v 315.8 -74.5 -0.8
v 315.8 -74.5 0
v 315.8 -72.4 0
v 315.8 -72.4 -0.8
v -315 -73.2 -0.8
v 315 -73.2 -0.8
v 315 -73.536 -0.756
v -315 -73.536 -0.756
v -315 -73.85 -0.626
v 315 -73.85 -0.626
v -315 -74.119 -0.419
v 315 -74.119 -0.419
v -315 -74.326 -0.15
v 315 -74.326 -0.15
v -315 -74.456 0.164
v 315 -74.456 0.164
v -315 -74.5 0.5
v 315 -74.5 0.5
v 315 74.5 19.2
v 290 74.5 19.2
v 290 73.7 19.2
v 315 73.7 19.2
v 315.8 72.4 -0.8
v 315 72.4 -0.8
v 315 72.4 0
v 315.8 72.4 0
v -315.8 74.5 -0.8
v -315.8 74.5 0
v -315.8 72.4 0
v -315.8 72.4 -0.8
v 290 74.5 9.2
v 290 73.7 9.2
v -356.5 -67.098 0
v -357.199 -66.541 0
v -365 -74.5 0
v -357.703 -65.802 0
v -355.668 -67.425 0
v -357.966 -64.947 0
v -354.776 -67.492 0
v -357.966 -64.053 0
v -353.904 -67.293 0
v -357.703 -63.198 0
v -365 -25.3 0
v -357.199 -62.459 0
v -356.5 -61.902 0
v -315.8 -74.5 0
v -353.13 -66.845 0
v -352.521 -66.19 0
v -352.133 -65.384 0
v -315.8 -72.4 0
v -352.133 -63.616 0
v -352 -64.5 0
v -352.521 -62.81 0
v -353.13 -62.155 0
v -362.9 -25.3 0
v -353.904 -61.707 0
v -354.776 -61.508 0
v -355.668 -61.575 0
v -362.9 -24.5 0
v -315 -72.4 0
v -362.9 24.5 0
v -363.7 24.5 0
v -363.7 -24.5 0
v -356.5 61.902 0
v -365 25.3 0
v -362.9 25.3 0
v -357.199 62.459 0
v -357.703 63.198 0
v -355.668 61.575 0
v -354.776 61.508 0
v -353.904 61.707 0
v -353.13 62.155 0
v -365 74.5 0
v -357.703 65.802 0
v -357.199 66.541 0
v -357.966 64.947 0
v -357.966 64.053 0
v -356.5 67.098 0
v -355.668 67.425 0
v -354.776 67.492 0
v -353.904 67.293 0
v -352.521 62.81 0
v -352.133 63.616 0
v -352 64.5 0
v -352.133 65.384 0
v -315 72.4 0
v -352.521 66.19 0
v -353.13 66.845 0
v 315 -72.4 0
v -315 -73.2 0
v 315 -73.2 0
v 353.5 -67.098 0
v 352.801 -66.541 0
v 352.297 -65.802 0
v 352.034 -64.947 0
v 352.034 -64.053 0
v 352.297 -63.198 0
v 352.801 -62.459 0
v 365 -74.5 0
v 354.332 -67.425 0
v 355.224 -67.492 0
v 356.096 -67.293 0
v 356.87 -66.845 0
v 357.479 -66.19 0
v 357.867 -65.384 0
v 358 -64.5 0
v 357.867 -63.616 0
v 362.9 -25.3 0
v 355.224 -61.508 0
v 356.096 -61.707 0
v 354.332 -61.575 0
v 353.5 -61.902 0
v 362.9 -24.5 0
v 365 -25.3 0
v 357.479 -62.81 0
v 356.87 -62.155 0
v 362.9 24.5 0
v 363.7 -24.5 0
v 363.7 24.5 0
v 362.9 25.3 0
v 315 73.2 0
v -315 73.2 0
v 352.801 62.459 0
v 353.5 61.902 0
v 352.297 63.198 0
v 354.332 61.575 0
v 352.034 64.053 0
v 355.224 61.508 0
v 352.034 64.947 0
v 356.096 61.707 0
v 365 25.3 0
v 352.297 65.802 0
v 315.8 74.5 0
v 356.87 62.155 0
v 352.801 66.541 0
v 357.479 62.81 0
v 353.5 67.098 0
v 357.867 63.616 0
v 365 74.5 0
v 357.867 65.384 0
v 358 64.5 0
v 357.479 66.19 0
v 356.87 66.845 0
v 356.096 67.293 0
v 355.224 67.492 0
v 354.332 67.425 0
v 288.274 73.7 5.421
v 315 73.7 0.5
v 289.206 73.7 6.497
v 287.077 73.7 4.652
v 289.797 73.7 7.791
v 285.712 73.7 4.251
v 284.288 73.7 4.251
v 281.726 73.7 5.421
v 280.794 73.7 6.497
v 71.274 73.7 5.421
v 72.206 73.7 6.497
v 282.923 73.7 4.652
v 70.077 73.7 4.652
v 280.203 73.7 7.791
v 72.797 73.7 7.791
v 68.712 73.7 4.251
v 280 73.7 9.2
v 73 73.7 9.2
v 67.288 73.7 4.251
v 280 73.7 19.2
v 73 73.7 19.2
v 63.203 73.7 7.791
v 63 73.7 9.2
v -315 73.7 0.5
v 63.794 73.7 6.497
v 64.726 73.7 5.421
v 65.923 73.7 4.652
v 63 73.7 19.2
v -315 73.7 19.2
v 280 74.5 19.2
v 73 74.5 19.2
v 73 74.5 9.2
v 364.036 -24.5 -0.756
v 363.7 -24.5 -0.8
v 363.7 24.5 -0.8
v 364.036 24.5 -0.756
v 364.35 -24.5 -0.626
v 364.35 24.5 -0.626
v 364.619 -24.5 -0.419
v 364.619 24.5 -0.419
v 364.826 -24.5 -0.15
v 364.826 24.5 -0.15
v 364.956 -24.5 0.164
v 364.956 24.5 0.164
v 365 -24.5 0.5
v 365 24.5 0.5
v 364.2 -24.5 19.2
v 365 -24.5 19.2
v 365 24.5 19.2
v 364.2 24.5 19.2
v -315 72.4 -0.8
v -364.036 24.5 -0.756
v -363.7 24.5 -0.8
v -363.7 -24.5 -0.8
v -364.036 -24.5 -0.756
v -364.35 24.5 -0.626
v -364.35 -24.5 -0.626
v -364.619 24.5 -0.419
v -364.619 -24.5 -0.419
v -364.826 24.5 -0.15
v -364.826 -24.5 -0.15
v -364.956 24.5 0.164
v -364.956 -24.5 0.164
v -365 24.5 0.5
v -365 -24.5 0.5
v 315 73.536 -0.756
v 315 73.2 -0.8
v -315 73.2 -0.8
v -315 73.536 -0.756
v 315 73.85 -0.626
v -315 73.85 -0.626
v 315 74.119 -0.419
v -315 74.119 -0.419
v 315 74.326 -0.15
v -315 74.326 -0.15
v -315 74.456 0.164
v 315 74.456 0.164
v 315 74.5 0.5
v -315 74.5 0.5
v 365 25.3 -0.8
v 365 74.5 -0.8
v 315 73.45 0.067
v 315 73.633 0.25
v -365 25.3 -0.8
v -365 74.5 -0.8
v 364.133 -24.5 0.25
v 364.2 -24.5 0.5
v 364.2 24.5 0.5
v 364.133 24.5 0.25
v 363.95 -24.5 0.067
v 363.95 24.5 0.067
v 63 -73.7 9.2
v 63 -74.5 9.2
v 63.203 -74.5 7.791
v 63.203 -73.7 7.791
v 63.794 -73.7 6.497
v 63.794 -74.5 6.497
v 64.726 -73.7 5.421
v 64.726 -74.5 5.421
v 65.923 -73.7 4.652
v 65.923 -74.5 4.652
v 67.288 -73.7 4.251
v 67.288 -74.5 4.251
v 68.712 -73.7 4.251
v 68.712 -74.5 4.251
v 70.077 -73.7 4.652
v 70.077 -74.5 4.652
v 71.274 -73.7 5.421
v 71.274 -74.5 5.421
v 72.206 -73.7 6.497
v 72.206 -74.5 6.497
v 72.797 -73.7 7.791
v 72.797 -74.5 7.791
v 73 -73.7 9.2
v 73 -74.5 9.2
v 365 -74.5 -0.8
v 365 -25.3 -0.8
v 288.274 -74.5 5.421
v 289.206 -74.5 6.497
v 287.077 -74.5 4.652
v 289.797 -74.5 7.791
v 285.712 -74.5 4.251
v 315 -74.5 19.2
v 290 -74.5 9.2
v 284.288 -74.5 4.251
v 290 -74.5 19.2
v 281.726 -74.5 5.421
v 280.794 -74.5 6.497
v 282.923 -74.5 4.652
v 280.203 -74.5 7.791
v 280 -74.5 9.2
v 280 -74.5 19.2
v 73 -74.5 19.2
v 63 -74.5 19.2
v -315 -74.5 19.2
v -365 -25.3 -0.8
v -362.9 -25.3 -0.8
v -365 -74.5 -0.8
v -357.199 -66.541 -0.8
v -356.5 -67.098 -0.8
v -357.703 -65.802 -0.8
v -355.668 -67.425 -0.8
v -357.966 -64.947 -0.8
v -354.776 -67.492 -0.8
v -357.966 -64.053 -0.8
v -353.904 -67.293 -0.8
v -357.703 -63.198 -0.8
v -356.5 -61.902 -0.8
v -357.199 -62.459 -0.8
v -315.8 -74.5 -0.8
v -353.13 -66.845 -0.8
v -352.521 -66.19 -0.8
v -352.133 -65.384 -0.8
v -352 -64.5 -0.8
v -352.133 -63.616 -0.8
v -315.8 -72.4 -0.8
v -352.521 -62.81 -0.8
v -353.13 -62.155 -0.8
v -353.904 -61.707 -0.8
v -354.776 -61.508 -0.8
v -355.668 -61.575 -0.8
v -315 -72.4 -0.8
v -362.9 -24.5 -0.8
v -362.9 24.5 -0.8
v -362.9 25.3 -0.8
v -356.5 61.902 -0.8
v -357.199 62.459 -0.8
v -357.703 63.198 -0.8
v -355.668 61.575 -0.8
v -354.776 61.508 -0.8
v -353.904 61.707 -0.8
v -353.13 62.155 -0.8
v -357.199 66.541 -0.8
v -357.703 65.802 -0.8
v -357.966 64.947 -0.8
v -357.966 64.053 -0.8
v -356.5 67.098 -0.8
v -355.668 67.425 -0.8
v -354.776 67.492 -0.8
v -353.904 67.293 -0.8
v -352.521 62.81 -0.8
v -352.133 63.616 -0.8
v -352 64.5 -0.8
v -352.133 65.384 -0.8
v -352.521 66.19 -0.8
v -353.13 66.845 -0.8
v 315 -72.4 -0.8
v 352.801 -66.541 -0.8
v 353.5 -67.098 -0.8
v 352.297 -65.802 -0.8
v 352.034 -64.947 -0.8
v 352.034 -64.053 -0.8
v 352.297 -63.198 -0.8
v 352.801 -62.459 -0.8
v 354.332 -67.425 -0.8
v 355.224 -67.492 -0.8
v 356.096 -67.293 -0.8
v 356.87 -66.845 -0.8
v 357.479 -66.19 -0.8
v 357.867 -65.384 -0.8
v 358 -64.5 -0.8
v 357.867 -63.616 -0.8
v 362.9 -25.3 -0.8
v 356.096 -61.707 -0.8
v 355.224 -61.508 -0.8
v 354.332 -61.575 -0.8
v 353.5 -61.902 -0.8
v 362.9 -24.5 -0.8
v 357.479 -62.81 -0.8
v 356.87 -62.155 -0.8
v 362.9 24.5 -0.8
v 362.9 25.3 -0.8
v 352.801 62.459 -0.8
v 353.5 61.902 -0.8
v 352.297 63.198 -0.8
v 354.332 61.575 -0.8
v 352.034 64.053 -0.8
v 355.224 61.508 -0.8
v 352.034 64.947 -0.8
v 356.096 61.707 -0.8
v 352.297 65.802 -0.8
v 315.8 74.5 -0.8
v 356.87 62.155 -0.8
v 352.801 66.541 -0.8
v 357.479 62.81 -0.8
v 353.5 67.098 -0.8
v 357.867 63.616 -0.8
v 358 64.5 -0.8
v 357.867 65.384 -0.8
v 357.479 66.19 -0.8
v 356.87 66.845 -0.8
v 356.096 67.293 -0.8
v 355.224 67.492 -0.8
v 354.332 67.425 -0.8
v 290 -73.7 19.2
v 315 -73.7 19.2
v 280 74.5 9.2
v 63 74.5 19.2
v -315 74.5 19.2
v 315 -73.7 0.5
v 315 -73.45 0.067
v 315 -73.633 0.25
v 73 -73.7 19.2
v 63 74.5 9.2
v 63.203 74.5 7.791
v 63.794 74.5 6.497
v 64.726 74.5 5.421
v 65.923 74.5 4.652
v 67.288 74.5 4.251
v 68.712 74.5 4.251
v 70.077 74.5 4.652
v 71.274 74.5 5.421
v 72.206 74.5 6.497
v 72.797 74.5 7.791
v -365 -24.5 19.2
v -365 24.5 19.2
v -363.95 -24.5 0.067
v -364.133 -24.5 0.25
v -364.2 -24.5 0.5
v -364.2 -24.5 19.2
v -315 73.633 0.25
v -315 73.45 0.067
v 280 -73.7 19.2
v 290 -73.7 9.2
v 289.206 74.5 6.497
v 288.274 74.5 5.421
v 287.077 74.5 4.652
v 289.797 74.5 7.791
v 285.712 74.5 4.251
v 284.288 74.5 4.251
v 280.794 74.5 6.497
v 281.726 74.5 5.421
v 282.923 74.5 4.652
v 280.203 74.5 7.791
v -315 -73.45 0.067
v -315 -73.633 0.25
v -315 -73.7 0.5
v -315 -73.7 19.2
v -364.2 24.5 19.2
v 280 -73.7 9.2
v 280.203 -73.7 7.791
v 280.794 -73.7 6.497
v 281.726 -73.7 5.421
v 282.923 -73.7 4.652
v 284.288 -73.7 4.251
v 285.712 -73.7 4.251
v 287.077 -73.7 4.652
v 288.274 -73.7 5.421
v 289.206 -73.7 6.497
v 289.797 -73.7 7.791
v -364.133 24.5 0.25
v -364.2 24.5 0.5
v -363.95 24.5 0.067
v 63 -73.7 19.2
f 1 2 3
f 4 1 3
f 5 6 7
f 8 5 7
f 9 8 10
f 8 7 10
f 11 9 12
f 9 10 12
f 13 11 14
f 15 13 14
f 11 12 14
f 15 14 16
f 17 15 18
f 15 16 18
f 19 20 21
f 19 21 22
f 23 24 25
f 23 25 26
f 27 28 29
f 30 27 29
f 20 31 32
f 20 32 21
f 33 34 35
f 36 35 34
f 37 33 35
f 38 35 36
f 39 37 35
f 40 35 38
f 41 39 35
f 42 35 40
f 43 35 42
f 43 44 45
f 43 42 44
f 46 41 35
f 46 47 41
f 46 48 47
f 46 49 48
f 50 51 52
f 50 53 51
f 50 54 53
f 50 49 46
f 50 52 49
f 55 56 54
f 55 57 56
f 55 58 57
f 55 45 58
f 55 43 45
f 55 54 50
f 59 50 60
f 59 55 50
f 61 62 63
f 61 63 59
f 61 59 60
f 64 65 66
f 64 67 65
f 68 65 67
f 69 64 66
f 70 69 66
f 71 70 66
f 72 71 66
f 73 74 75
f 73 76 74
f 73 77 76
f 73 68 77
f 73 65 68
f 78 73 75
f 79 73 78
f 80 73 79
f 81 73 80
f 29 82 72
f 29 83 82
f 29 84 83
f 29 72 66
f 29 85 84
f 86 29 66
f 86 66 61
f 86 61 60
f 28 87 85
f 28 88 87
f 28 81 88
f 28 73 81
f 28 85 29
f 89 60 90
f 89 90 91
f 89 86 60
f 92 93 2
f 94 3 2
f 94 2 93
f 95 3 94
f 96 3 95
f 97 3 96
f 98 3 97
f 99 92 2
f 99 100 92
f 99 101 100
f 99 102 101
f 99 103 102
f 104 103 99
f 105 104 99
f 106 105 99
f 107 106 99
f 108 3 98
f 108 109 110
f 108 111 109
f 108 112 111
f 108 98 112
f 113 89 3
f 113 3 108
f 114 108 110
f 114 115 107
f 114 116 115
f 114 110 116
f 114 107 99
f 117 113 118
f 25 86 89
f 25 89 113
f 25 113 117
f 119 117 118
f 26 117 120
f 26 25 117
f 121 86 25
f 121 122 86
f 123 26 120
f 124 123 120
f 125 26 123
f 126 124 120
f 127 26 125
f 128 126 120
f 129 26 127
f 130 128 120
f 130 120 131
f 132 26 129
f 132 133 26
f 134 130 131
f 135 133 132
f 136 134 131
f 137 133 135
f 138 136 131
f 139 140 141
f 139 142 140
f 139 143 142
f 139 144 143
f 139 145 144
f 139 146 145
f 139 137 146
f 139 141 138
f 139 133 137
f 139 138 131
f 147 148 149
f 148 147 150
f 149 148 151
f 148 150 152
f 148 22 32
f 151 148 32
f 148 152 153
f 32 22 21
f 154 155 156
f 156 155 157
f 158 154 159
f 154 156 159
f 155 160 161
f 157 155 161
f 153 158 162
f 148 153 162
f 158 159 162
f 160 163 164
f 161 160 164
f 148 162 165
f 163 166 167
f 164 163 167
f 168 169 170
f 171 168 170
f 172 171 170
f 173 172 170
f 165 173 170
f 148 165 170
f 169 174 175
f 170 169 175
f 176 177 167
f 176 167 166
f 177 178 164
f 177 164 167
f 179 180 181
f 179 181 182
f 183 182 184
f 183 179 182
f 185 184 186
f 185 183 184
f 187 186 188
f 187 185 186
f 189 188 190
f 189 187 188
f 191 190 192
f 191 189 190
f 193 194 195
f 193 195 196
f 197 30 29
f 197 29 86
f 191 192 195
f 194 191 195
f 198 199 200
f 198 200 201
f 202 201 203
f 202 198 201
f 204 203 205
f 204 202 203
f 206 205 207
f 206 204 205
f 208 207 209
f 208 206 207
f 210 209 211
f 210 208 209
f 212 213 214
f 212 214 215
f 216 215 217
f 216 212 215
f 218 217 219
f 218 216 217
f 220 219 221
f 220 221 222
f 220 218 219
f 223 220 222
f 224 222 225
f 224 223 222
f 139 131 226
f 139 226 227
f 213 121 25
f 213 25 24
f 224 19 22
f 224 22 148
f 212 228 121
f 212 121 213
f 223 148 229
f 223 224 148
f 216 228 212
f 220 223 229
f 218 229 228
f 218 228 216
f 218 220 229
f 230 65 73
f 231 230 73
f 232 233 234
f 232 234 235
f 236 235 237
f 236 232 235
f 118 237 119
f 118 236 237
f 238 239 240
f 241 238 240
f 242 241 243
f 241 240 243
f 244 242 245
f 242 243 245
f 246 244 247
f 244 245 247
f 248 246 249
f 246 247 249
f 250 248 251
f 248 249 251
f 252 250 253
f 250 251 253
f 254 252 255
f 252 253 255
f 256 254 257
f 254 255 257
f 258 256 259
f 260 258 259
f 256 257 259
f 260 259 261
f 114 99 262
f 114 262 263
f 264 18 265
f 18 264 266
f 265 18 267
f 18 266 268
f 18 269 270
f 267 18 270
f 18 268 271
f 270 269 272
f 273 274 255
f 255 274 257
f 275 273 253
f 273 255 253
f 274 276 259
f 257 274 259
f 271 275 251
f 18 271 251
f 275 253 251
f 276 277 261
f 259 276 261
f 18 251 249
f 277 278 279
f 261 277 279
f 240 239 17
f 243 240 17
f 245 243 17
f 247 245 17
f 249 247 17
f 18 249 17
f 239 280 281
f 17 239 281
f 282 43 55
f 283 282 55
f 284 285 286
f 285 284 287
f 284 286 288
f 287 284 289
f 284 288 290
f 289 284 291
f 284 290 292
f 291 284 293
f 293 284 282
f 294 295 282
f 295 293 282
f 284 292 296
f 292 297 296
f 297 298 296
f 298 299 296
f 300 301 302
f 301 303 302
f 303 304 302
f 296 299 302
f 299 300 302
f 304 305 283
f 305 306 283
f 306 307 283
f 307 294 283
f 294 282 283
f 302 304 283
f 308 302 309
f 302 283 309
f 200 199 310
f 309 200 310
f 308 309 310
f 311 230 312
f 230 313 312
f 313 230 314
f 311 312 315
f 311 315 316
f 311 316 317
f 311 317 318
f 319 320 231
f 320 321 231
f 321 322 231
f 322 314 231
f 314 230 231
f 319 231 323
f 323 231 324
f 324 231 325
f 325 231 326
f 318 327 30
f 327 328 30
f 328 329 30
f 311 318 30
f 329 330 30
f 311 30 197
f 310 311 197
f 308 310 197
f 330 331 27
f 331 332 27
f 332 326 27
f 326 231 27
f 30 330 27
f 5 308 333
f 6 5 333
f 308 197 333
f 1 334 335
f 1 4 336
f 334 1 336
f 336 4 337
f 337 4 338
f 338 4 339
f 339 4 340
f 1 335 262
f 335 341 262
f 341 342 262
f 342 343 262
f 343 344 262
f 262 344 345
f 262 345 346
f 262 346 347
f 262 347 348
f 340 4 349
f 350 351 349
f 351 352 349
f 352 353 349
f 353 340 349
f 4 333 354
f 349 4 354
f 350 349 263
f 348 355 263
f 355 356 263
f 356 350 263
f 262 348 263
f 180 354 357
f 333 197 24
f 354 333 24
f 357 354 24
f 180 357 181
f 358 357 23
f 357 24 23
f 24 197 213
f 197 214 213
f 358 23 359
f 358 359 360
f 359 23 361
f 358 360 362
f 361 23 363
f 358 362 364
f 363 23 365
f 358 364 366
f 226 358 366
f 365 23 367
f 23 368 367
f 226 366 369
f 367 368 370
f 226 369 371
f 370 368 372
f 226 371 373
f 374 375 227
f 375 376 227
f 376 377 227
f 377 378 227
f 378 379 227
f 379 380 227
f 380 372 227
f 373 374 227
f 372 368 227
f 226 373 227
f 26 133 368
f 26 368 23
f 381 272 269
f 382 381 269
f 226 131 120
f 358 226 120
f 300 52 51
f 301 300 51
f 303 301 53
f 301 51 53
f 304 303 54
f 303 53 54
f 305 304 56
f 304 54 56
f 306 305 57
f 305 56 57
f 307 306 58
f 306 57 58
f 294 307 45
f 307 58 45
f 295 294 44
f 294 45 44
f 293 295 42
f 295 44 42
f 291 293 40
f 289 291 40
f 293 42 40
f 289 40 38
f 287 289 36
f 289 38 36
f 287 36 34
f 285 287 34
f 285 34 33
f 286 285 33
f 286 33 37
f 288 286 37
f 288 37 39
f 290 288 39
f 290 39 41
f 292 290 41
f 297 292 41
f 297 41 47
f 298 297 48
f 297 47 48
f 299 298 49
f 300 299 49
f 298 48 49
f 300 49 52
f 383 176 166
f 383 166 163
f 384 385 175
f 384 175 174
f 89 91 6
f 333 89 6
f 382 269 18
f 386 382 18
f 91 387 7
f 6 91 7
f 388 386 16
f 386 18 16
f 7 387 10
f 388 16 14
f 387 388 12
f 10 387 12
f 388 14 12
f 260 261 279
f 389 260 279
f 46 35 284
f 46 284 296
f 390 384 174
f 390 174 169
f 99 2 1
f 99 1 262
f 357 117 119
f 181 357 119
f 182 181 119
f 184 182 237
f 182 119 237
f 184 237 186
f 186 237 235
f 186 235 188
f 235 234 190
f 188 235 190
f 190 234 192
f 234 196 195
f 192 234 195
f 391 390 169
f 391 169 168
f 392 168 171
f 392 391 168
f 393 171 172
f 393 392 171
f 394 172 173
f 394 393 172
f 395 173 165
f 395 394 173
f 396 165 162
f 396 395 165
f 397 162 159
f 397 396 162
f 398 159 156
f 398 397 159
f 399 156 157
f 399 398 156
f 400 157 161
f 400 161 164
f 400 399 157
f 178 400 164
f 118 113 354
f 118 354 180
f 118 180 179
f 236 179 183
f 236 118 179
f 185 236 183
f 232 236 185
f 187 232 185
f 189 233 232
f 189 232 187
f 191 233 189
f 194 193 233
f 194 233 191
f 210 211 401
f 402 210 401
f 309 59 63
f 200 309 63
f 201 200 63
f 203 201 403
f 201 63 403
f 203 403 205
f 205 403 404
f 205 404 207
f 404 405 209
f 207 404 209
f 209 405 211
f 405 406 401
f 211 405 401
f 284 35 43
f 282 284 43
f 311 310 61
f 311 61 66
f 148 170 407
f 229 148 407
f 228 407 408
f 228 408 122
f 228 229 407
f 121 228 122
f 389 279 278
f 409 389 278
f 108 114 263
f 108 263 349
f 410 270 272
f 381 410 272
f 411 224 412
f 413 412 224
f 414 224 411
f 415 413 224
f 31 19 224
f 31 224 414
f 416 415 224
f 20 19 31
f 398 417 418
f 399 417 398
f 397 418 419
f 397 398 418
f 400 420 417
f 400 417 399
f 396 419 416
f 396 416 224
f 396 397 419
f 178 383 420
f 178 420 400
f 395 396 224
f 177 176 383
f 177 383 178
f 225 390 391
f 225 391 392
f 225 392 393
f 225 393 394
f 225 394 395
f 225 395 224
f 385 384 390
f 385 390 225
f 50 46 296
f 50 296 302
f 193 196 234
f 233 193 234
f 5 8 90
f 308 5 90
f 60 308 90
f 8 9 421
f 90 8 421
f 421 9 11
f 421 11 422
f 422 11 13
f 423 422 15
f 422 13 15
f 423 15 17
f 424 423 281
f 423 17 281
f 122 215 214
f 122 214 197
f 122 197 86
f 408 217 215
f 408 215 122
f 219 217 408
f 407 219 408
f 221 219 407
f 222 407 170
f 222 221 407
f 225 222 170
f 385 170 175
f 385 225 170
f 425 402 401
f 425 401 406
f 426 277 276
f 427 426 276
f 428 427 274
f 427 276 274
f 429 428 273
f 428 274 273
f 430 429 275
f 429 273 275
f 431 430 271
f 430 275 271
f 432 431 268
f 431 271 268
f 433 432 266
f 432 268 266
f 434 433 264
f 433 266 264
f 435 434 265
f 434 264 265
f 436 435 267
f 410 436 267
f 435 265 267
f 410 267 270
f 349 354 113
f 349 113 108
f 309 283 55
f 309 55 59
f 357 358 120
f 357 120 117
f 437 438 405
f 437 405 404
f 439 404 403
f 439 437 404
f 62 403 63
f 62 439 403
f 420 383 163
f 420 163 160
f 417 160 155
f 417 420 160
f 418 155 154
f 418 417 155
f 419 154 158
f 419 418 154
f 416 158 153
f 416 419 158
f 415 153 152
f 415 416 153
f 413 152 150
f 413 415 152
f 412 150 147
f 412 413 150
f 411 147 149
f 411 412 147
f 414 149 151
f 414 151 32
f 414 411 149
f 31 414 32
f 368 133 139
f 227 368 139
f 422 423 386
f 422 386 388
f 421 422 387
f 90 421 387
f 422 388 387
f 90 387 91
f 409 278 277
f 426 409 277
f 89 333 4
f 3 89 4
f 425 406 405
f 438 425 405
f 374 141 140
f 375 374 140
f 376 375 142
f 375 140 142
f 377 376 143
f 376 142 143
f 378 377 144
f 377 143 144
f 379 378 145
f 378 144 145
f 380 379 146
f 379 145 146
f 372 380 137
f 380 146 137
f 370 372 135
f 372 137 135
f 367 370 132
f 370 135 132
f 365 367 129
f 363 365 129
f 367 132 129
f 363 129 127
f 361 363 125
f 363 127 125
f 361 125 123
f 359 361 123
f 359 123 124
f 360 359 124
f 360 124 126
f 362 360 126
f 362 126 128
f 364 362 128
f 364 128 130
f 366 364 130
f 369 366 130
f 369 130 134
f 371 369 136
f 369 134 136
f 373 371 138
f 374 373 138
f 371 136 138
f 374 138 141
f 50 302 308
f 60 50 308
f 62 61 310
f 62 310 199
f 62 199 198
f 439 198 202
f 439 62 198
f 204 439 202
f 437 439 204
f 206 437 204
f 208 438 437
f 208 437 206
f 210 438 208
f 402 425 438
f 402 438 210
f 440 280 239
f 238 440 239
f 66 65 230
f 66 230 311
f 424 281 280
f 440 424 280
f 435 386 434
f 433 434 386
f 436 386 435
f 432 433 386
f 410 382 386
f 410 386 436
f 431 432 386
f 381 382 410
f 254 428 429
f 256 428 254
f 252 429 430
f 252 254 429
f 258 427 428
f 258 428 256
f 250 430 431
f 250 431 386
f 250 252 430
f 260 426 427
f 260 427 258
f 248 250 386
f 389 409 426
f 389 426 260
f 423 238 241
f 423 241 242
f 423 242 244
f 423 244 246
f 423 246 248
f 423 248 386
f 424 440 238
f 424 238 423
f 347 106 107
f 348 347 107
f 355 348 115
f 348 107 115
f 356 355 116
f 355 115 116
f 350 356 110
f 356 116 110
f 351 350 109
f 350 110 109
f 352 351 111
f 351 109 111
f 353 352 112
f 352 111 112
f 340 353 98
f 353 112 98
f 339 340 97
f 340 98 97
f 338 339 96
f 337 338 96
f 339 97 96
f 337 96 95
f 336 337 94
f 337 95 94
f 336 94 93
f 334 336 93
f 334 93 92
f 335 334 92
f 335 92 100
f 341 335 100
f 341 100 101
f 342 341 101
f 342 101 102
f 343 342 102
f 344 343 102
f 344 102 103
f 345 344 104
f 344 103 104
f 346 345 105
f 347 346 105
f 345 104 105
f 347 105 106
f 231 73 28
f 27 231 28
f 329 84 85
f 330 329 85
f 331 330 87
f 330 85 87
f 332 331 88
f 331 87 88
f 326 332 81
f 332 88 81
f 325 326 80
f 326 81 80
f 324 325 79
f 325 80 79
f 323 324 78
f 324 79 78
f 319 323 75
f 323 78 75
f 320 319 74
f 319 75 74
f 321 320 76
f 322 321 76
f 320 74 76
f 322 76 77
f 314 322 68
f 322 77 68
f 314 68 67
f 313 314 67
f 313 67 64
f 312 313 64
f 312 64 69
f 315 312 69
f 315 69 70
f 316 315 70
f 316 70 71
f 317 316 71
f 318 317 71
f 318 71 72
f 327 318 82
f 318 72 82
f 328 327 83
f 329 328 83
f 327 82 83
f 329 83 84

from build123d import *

# Parameters (mm, degrees)
SKETCH_1_W                        = 730
SKETCH_1_H                        = 149
SKETCH_1_R                        = 3
SM_BASE_FLANGE_1_DEPTH            = 0.8
SM_EDGE_FLANGE_1_STRIP_W          = 4.2
SM_EDGE_FLANGE_1_STRIP_H          = 0.8
SM_EDGE_FLANGE_1_STRIP_CUT_DEPTH  = 49
SM_EDGE_FLANGE_1_RELIEF_W         = 5
SM_EDGE_FLANGE_1_RELIEF_H         = 0.8
SM_EDGE_FLANGE_1_RELIEF_CUT_DEPTH = 0.8
SM_EDGE_FLANGE_1_DEPTH            = 49
SM_EDGE_FLANGE_2_STRIP_W          = 4.2
SM_EDGE_FLANGE_2_STRIP_H          = 0.8
SM_EDGE_FLANGE_2_STRIP_CUT_DEPTH  = 49
SM_EDGE_FLANGE_2_RELIEF_W         = 5
SM_EDGE_FLANGE_2_RELIEF_H         = 0.8
SM_EDGE_FLANGE_2_RELIEF_CUT_DEPTH = 0.8
SM_EDGE_FLANGE_2_DEPTH            = 49
SM_EDGE_FLANGE_3_STRIP_W          = 4.2
SM_EDGE_FLANGE_3_STRIP_H          = 0.8
SM_EDGE_FLANGE_3_STRIP_CUT_DEPTH  = 630
SM_EDGE_FLANGE_3_RELIEF_W         = 5
SM_EDGE_FLANGE_3_RELIEF_H         = 0.8
SM_EDGE_FLANGE_3_RELIEF_CUT_DEPTH = 0.8
SM_EDGE_FLANGE_3_DEPTH            = 630
SM_EDGE_FLANGE_3_FLAT_DEPTH       = 0.8


# Sheet-metal steps are written as plain solids
with BuildPart() as part:
    # Sketch 1 → 基体-法兰1 (new body)
    with BuildSketch(Plane.XY):
        Rectangle(SKETCH_1_W, SKETCH_1_H)
        with Locations((-355, 64.5)):
            Circle(SKETCH_1_R, mode=Mode.SUBTRACT)
        with Locations((-355, -64.5)):
            Circle(SKETCH_1_R, mode=Mode.SUBTRACT)
        with Locations((355, 64.5)):
            Circle(SKETCH_1_R, mode=Mode.SUBTRACT)
        with Locations((355, -64.5)):
            Circle(SKETCH_1_R, mode=Mode.SUBTRACT)
    extrude(amount=-SM_BASE_FLANGE_1_DEPTH)

    # 边线-法兰1 strip (across the edge) → 边线-法兰1 strip cut (cut)
    with BuildSketch(Plane(origin=(-365, 24.5, 0), x_dir=(1, 0, 0), z_dir=(0, -1, 0))):
        with Locations((-0.8, -0.4)):
            Rectangle(SM_EDGE_FLANGE_1_STRIP_W, SM_EDGE_FLANGE_1_STRIP_H)
    extrude(amount=SM_EDGE_FLANGE_1_STRIP_CUT_DEPTH, mode=Mode.SUBTRACT)

    # 边线-法兰1 relief (on the sheet) → 边线-法兰1 relief cut (cut)
    with BuildSketch(Plane(origin=(-363.7, 24.5, 0), x_dir=(1, 0, 0), z_dir=(0, 0, 1))):
        with Locations((-1.7, 0.4)):
            Rectangle(SM_EDGE_FLANGE_1_RELIEF_W, SM_EDGE_FLANGE_1_RELIEF_H)
        with Locations((-1.7, -49.4)):
            Rectangle(SM_EDGE_FLANGE_1_RELIEF_W, SM_EDGE_FLANGE_1_RELIEF_H)
    extrude(amount=-SM_EDGE_FLANGE_1_RELIEF_CUT_DEPTH, mode=Mode.SUBTRACT)

    # 边线-法兰1 section (across the edge) → 边线-法兰1 (add)
    with BuildSketch(Plane(origin=(-365, 24.5, 0), x_dir=(1, 0, 0), z_dir=(0, -1, 0))):
        with BuildLine():
            Line((0, 0.5), (0, 19.2))
            Line((0, 19.2), (0.8, 19.2))
            Line((0.8, 19.2), (0.8, 0.5))
            ThreePointArc((0.8, 0.5), (0.946446609, 0.146446609), (1.3, 0))
            Line((1.3, 0), (1.3, -0.8))
            ThreePointArc((1.3, -0.8), (0.380761184, -0.419238816), (0, 0.5))
        make_face()
    extrude(amount=SM_EDGE_FLANGE_1_DEPTH)

    # 边线-法兰2 strip (across the edge) → 边线-法兰2 strip cut (cut)
    with BuildSketch(Plane(origin=(365, -24.5, 0), x_dir=(-1, 0, 0), z_dir=(0, 1, 0))):
        with Locations((-0.8, -0.4)):
            Rectangle(SM_EDGE_FLANGE_2_STRIP_W, SM_EDGE_FLANGE_2_STRIP_H)
    extrude(amount=SM_EDGE_FLANGE_2_STRIP_CUT_DEPTH, mode=Mode.SUBTRACT)

    # 边线-法兰2 relief (on the sheet) → 边线-法兰2 relief cut (cut)
    with BuildSketch(Plane(origin=(363.7, -24.5, 0), x_dir=(-1, 0, 0), z_dir=(0, 0, 1))):
        with Locations((-1.7, 0.4)):
            Rectangle(SM_EDGE_FLANGE_2_RELIEF_W, SM_EDGE_FLANGE_2_RELIEF_H)
        with Locations((-1.7, -49.4)):
            Rectangle(SM_EDGE_FLANGE_2_RELIEF_W, SM_EDGE_FLANGE_2_RELIEF_H)
    extrude(amount=-SM_EDGE_FLANGE_2_RELIEF_CUT_DEPTH, mode=Mode.SUBTRACT)

    # 边线-法兰2 section (across the edge) → 边线-法兰2 (add)
    with BuildSketch(Plane(origin=(365, -24.5, 0), x_dir=(-1, 0, 0), z_dir=(0, 1, 0))):
        with BuildLine():
            Line((0, 0.5), (0, 19.2))
            Line((0, 19.2), (0.8, 19.2))
            Line((0.8, 19.2), (0.8, 0.5))
            ThreePointArc((0.8, 0.5), (0.946446609, 0.146446609), (1.3, 0))
            Line((1.3, 0), (1.3, -0.8))
            ThreePointArc((1.3, -0.8), (0.380761184, -0.419238816), (0, 0.5))
        make_face()
    extrude(amount=SM_EDGE_FLANGE_2_DEPTH)

    # 边线-法兰3 strip (across the edge) → 边线-法兰3 strip cut (cut)
    with BuildSketch(Plane(origin=(315, 74.5, 0), x_dir=(0, -1, 0), z_dir=(-1, 0, 0))):
        with Locations((-0.8, -0.4)):
            Rectangle(SM_EDGE_FLANGE_3_STRIP_W, SM_EDGE_FLANGE_3_STRIP_H)
    sm_edge_flange_3_strip_cut = extrude(amount=SM_EDGE_FLANGE_3_STRIP_CUT_DEPTH, mode=Mode.SUBTRACT)

    # 边线-法兰3 relief (on the sheet) → 边线-法兰3 relief cut (cut)
    with BuildSketch(Plane(origin=(315, 73.2, 0), x_dir=(0, -1, 0), z_dir=(0, 0, 1))):
        with Locations((-1.7, 0.4)):
            Rectangle(SM_EDGE_FLANGE_3_RELIEF_W, SM_EDGE_FLANGE_3_RELIEF_H)
        with Locations((-1.7, -630.4)):
            Rectangle(SM_EDGE_FLANGE_3_RELIEF_W, SM_EDGE_FLANGE_3_RELIEF_H)
    sm_edge_flange_3_relief_cut = extrude(amount=-SM_EDGE_FLANGE_3_RELIEF_CUT_DEPTH, mode=Mode.SUBTRACT)

    # 边线-法兰3 bend section (across the edge) → 边线-法兰3 (add)
    with BuildSketch(Plane(origin=(315, 74.5, 0), x_dir=(0, -1, 0), z_dir=(-1, 0, 0))):
        with BuildLine():
            Line((0, 0.5), (0.8, 0.5))
            ThreePointArc((0.8, 0.5), (0.946446609, 0.146446609), (1.3, 0))
            Line((1.3, 0), (1.3, -0.8))
            ThreePointArc((1.3, -0.8), (0.380761184, -0.419238816), (0, 0.5))
        make_face()
    sm_edge_flange_3 = extrude(amount=SM_EDGE_FLANGE_3_DEPTH)

    # 边线-法兰3 profile (on flange) → 边线-法兰3 flat (add)
    with BuildSketch(Plane(origin=(0, 74.5, 0), x_dir=(-1, 0, 0), z_dir=(0, 1, 0))):
        with BuildLine():
            Line((-315, 0.5), (315, 0.5))
            Line((315, 0.5), (315, 19.2))
            Line((315, 19.2), (-63, 19.2))
            Line((-63, 19.2), (-63, 9.2))
            ThreePointArc((-63, 9.2), (-68, 4.2), (-73, 9.2))
            Line((-73, 9.2), (-73, 19.2))
            Line((-73, 19.2), (-280, 19.2))
            Line((-280, 19.2), (-280, 9.2))
            ThreePointArc((-280, 9.2), (-285, 4.2), (-290, 9.2))
            Line((-290, 9.2), (-290, 19.2))
            Line((-290, 19.2), (-315, 19.2))
            Line((-315, 19.2), (-315, 0.5))
        make_face()
    sm_edge_flange_3_flat = extrude(amount=-SM_EDGE_FLANGE_3_FLAT_DEPTH)

    # 镜向1: 边线-法兰3 strip cut, 边线-法兰3 relief cut, 边线-法兰3, 边线-法兰3 flat across plane
    add(sm_edge_flange_3_strip_cut.mirror(Plane.ZX), mode=Mode.SUBTRACT)
    add(sm_edge_flange_3_relief_cut.mirror(Plane.ZX), mode=Mode.SUBTRACT)
    add(sm_edge_flange_3.mirror(Plane.ZX))
    add(sm_edge_flange_3_flat.mirror(Plane.ZX))


solid = part.part
